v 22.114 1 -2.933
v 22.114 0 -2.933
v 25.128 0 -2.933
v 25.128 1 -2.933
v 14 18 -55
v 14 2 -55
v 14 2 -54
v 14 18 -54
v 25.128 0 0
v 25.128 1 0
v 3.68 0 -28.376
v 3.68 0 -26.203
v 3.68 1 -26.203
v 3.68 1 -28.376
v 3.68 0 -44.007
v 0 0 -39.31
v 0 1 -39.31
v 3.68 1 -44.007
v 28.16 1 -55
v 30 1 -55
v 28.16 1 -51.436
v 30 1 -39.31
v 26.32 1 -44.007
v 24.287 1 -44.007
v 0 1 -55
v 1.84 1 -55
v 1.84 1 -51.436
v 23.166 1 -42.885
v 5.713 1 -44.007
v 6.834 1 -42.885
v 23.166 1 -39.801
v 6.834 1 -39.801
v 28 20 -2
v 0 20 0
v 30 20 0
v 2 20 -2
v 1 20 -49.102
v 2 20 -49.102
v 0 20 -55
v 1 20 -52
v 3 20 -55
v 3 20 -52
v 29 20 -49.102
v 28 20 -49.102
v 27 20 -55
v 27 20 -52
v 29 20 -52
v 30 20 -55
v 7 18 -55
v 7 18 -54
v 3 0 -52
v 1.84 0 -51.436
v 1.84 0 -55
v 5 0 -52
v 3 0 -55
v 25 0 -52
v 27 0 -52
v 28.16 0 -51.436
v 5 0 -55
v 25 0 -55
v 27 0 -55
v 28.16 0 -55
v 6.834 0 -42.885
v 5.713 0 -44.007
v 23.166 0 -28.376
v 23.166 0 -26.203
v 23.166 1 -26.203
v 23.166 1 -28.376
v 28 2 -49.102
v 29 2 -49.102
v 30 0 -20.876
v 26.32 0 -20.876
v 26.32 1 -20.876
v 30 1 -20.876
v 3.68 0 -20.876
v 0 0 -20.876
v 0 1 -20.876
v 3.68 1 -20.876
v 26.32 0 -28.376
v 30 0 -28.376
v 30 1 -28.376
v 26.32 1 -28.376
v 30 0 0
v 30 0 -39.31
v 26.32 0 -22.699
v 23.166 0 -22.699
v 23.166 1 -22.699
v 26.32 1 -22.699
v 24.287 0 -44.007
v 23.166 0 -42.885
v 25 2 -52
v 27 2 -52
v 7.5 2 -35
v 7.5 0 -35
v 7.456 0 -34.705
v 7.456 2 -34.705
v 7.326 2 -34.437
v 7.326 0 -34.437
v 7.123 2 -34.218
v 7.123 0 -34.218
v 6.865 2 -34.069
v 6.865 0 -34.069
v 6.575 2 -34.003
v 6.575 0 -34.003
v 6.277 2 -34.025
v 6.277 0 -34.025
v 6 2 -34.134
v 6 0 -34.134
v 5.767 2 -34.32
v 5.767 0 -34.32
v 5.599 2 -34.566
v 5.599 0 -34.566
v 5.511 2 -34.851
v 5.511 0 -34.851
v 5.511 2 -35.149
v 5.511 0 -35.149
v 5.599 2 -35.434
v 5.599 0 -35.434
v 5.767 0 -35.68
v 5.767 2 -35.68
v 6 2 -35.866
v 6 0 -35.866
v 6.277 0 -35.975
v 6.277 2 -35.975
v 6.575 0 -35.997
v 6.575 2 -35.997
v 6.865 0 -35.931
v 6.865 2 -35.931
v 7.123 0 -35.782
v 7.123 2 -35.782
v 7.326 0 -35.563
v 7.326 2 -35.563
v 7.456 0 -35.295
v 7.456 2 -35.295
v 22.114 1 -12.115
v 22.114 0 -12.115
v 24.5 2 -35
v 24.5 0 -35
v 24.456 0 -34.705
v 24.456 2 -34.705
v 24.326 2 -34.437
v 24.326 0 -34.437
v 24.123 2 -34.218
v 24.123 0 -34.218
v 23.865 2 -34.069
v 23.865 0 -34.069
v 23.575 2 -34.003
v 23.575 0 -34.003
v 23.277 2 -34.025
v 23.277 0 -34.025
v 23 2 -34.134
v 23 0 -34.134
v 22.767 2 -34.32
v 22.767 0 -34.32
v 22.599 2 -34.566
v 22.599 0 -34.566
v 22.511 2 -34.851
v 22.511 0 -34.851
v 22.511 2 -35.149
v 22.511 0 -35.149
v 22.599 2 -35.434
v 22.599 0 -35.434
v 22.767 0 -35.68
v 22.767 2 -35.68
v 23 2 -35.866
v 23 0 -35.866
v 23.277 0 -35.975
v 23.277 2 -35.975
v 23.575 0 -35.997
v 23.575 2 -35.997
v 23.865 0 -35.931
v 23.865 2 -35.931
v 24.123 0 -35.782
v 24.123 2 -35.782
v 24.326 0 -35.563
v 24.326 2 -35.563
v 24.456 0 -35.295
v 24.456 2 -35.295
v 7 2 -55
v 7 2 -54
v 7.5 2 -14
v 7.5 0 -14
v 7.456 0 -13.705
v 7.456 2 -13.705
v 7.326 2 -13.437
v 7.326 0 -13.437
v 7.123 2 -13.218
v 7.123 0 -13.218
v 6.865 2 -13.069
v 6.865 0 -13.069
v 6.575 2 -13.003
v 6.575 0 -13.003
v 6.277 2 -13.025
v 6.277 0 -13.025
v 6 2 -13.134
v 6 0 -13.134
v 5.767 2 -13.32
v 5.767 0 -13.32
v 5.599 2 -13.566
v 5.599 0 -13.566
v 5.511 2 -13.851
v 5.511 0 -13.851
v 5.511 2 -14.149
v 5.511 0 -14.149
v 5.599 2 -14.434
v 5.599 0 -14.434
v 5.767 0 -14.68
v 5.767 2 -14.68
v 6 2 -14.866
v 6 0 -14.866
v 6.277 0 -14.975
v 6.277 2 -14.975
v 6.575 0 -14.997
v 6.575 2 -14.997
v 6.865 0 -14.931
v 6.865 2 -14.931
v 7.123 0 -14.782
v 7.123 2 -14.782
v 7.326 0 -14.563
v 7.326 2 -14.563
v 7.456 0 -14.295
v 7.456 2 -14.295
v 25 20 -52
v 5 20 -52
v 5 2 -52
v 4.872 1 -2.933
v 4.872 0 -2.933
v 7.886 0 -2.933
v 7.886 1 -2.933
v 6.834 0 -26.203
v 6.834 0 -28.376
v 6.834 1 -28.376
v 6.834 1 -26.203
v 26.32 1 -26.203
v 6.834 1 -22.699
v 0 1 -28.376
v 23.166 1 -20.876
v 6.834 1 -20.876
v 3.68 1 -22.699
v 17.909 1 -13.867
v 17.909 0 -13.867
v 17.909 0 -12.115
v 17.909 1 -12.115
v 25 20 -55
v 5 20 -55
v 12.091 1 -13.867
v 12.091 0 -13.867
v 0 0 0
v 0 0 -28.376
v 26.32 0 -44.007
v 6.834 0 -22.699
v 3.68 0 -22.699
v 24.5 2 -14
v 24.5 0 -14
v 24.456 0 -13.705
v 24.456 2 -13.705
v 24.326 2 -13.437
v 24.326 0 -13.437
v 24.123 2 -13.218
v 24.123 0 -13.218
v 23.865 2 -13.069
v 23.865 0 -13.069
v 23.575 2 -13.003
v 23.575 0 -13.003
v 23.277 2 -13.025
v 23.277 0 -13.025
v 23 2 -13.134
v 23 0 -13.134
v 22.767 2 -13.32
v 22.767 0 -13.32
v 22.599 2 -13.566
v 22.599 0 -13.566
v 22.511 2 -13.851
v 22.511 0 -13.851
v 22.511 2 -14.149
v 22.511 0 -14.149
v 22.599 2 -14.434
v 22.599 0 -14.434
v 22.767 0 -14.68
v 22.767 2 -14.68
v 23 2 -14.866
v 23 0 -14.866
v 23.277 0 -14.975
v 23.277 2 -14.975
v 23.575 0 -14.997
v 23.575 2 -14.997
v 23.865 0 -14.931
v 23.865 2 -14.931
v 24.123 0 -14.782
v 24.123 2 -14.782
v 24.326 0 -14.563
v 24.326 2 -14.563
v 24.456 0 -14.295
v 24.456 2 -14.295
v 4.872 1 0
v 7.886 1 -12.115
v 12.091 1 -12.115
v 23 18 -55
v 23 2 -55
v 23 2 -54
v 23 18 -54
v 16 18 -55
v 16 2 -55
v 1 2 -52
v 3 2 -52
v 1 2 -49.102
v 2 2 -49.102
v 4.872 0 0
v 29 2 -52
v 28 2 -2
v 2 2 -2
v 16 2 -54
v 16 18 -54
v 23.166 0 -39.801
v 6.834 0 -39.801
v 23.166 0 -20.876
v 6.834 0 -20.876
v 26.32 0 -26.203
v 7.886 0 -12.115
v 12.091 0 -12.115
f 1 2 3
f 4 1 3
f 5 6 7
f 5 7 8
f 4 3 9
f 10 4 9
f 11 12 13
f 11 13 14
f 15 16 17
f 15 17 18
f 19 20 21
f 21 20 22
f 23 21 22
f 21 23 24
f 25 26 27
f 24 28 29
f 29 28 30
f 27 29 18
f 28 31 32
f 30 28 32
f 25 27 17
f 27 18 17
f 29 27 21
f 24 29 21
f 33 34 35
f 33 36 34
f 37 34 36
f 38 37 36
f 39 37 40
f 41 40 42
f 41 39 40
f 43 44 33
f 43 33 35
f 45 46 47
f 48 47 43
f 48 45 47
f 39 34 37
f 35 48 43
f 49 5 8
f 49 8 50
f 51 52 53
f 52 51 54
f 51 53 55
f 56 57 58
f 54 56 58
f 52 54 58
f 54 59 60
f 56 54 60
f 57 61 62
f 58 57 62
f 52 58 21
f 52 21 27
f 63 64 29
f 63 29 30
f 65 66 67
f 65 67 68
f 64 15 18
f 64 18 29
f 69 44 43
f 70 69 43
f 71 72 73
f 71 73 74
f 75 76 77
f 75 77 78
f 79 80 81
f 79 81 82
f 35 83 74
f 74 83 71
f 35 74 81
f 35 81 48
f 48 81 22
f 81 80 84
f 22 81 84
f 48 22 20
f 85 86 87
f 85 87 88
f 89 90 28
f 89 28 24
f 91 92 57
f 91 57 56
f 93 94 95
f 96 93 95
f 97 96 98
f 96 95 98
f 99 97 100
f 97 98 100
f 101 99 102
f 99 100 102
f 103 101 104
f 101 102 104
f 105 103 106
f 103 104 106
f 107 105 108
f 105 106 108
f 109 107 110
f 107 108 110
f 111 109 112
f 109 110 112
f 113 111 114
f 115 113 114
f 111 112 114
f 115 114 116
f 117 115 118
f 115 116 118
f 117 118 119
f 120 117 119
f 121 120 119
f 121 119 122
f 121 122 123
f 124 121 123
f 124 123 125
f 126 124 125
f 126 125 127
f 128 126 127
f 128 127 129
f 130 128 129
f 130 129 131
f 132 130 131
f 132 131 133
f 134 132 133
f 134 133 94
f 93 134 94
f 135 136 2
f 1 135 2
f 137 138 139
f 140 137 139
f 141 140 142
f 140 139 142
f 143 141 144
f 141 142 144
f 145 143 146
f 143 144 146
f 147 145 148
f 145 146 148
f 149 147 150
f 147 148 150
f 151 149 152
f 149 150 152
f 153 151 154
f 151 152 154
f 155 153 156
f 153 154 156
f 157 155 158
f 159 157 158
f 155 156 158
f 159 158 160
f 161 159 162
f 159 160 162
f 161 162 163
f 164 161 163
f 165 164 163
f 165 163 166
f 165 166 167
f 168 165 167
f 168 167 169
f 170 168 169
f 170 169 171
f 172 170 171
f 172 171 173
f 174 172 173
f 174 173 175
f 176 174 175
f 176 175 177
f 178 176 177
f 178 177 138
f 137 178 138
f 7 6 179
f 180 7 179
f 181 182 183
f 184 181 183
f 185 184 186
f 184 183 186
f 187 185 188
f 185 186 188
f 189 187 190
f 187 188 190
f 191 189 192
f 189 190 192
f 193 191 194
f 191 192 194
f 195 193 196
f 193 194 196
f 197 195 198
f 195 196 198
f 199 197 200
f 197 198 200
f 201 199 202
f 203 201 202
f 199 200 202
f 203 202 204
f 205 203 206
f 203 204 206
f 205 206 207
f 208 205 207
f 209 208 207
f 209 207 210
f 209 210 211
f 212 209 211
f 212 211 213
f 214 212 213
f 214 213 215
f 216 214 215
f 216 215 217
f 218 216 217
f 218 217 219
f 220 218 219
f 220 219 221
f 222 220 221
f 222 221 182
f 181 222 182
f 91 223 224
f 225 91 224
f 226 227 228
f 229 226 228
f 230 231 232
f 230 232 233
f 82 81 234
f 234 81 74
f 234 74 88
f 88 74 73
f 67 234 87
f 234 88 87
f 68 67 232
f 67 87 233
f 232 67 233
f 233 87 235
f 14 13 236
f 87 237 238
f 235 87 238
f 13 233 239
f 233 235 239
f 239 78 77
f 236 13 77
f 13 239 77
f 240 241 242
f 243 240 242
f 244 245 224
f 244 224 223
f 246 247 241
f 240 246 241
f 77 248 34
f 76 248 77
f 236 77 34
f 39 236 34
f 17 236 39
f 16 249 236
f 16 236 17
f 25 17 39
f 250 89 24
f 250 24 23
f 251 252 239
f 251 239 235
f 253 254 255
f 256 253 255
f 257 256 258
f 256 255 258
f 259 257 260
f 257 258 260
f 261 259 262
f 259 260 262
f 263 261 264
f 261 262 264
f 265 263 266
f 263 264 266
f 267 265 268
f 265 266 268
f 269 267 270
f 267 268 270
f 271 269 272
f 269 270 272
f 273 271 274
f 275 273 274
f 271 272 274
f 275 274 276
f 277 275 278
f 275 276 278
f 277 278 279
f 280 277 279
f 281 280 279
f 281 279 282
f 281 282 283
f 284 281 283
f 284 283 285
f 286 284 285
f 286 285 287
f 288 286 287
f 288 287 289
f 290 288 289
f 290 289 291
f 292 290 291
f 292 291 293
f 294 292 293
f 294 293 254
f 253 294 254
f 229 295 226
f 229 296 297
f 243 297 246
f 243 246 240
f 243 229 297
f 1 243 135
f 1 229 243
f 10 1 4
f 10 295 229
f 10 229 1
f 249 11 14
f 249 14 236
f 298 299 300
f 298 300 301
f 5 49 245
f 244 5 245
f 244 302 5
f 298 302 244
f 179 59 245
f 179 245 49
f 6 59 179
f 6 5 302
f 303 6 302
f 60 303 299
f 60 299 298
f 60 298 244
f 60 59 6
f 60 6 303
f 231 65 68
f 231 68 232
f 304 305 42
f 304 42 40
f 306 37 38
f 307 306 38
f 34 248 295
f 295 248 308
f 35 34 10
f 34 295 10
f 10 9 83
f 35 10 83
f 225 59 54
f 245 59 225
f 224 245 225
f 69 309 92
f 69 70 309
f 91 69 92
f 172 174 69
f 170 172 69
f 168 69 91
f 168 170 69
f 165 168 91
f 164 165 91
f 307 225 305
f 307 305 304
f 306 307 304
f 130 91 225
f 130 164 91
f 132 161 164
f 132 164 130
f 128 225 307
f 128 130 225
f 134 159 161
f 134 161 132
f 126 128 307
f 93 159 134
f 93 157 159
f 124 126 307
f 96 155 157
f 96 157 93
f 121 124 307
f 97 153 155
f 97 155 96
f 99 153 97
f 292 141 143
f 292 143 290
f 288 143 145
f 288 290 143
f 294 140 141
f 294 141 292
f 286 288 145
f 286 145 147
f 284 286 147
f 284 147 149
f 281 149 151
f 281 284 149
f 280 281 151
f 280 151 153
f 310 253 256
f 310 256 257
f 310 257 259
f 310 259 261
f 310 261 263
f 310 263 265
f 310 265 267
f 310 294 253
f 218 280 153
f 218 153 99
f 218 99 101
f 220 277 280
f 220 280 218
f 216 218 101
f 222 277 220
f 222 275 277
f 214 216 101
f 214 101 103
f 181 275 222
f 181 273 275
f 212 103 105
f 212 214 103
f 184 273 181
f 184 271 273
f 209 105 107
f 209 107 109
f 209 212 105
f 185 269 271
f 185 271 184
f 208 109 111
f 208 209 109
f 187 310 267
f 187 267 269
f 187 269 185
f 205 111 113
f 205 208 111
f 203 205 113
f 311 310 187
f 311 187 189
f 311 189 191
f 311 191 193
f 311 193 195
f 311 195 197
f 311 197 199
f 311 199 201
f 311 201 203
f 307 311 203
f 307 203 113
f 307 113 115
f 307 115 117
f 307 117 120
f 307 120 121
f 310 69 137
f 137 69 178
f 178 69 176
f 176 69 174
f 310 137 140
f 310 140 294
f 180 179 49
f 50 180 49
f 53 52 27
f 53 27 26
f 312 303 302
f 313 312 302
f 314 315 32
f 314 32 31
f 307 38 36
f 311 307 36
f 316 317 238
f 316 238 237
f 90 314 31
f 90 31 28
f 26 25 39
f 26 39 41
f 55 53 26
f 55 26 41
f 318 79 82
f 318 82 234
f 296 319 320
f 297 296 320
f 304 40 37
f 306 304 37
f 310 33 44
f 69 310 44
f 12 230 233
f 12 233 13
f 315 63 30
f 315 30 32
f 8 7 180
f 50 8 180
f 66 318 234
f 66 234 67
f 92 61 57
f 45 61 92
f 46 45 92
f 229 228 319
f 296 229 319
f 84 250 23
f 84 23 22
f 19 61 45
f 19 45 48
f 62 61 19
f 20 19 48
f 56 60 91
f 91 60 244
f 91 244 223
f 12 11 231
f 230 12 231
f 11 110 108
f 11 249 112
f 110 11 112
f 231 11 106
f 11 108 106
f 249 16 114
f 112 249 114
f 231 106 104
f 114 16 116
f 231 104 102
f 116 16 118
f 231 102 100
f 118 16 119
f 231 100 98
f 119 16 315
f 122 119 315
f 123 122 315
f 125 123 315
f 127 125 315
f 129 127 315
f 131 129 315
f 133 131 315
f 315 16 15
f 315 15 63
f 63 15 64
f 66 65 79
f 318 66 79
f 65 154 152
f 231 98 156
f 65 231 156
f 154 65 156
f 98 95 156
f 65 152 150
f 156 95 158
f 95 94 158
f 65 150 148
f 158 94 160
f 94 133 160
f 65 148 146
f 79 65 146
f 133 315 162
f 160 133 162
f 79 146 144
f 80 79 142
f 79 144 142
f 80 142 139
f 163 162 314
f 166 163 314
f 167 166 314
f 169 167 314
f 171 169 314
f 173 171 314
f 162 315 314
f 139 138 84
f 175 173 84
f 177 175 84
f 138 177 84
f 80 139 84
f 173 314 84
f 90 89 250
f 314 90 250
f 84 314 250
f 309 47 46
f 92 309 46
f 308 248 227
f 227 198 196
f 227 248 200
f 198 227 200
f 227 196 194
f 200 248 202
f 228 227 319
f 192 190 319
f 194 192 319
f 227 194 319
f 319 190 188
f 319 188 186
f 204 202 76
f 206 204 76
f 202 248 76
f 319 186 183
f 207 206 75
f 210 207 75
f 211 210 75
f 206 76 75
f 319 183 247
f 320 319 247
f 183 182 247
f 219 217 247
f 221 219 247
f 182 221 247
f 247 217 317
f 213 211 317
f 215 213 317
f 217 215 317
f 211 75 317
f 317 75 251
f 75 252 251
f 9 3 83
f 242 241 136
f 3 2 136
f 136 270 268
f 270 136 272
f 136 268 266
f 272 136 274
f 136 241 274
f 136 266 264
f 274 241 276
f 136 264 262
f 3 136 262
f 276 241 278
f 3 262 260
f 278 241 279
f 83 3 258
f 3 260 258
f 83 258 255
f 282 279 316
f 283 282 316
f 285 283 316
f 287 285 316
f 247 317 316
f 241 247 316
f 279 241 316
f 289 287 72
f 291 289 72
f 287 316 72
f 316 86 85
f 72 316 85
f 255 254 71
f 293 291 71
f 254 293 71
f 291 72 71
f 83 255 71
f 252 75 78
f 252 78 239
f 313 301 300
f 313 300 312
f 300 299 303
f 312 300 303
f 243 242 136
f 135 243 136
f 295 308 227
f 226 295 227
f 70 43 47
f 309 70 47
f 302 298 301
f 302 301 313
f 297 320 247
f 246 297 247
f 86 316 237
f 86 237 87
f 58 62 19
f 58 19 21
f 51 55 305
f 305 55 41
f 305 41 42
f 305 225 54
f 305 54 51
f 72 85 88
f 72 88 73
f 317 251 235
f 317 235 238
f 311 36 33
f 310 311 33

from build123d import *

# Parameters (mm, degrees)
SKETCH1_W           = 30
SKETCH1_H           = 55
BOSS_EXTRUDE1_DEPTH = 20
CUT_EXTRUDE1_DEPTH  = 18
SKETCH3_W           = 2
SKETCH3_H           = 3
CUT_EXTRUDE2_DEPTH  = 21
SKETCH4_W           = 7
SKETCH4_H           = 16
CUT_EXTRUDE3_DEPTH  = 1
SKETCH5_R           = 1
CUT_EXTRUDE4_DEPTH  = 21
CUT_EXTRUDE5_DEPTH  = 1


with BuildPart() as part:
    # Sketch1 → Boss-Extrude1 (new body)
    with BuildSketch(Plane(origin=(0, 0, 0), x_dir=(1, 0, 0), z_dir=(0, 1, 0))):
        with Locations((15, 27.5)):
            Rectangle(SKETCH1_W, SKETCH1_H)
    extrude(amount=BOSS_EXTRUDE1_DEPTH)

    # Sketch2 → Cut-Extrude1 (cut)
    with BuildSketch(Plane(origin=(0, 20, 0), x_dir=(-1, 0, 0), z_dir=(0, 1, 0))):
        Polygon((-29, -52), (-1, -52), (-1, -49.101557188), (-2, -49.101557188), (-2, -2), (-28, -2), (-28, -49.101557188), (-29, -49.101557188), align=None)
    extrude(amount=-CUT_EXTRUDE1_DEPTH, mode=Mode.SUBTRACT)

    # Sketch3 → Cut-Extrude2 (cut, through all)
    with BuildSketch(Plane(origin=(0, 20, 0), x_dir=(-1, 0, 0), z_dir=(0, 1, 0))):
        with Locations((-4, -53.5)):
            Rectangle(SKETCH3_W, SKETCH3_H)
        with Locations((-26, -53.5)):
            Rectangle(SKETCH3_W, SKETCH3_H)
    extrude(amount=-CUT_EXTRUDE2_DEPTH, mode=Mode.SUBTRACT)

    # Sketch4 → Cut-Extrude3 (cut)
    with BuildSketch(Plane(origin=(0, 0, -55), x_dir=(-1, 0, 0), z_dir=(0, 0, -1))):
        with Locations((-19.5, 10)):
            Rectangle(SKETCH4_W, SKETCH4_H)
        with Locations((-10.5, 10)):
            Rectangle(SKETCH4_W, SKETCH4_H)
    extrude(amount=-CUT_EXTRUDE3_DEPTH, mode=Mode.SUBTRACT)

    # Sketch5 → Cut-Extrude4 (cut, through all)
    with BuildSketch(Plane.XZ):
        with Locations((6.5, -14)):
            Circle(SKETCH5_R)
        with Locations((23.5, -14)):
            Circle(SKETCH5_R)
        with Locations((6.5, -35)):
            Circle(SKETCH5_R)
        with Locations((23.5, -35)):
            Circle(SKETCH5_R)
    extrude(amount=-CUT_EXTRUDE4_DEPTH, mode=Mode.SUBTRACT)

    # Sketch6 → Cut-Extrude5 (cut)
    with BuildSketch(Plane.XZ):
        Polygon((4.871763373, 0), (4.871763373, -2.932893163), (7.8857023, -2.932893163), (7.8857023, -12.114893151), (12.091198477, -12.114893151), (12.091198477, -13.867183225), (17.908801523, -13.867183225), (17.908801523, -12.114893151), (22.1142977, -12.114893151), (22.1142977, -2.932893163), (25.128236627, -2.932893163), (25.128236627, 0), align=None)
        Polygon((0, -20.87634352), (3.680206122, -20.87634352), (3.680206122, -22.698725197), (6.834328255, -22.698725197), (6.834328255, -20.87634352), (23.165671745, -20.87634352), (23.165671745, -22.698725197), (26.319793878, -22.698725197), (26.319793878, -20.87634352), (30, -20.87634352), (30, -28.376145037), (26.319793878, -28.376145037), (26.319793878, -26.203305345), (23.165671745, -26.203305345), (23.165671745, -28.376145037), (6.834328255, -28.376145037), (6.834328255, -26.203305345), (3.680206122, -26.203305345), (3.680206122, -28.376145037), (0, -28.376145037), align=None)
        Polygon((0, -39.310435098), (3.680206122, -44.006572497), (5.712862608, -44.006572497), (6.834328255, -42.885106849), (6.834328255, -39.801076319), (23.165671745, -39.801076319), (23.165671745, -42.885106849), (24.287137392, -44.006572497), (26.319793878, -44.006572497), (30, -39.310435098), (30, -55), (28.159896939, -55), (28.159896939, -51.43628241), (1.840103061, -51.43628241), (1.840103061, -55), (0, -55), align=None)
    extrude(amount=-CUT_EXTRUDE5_DEPTH, mode=Mode.SUBTRACT)


solid = part.part
